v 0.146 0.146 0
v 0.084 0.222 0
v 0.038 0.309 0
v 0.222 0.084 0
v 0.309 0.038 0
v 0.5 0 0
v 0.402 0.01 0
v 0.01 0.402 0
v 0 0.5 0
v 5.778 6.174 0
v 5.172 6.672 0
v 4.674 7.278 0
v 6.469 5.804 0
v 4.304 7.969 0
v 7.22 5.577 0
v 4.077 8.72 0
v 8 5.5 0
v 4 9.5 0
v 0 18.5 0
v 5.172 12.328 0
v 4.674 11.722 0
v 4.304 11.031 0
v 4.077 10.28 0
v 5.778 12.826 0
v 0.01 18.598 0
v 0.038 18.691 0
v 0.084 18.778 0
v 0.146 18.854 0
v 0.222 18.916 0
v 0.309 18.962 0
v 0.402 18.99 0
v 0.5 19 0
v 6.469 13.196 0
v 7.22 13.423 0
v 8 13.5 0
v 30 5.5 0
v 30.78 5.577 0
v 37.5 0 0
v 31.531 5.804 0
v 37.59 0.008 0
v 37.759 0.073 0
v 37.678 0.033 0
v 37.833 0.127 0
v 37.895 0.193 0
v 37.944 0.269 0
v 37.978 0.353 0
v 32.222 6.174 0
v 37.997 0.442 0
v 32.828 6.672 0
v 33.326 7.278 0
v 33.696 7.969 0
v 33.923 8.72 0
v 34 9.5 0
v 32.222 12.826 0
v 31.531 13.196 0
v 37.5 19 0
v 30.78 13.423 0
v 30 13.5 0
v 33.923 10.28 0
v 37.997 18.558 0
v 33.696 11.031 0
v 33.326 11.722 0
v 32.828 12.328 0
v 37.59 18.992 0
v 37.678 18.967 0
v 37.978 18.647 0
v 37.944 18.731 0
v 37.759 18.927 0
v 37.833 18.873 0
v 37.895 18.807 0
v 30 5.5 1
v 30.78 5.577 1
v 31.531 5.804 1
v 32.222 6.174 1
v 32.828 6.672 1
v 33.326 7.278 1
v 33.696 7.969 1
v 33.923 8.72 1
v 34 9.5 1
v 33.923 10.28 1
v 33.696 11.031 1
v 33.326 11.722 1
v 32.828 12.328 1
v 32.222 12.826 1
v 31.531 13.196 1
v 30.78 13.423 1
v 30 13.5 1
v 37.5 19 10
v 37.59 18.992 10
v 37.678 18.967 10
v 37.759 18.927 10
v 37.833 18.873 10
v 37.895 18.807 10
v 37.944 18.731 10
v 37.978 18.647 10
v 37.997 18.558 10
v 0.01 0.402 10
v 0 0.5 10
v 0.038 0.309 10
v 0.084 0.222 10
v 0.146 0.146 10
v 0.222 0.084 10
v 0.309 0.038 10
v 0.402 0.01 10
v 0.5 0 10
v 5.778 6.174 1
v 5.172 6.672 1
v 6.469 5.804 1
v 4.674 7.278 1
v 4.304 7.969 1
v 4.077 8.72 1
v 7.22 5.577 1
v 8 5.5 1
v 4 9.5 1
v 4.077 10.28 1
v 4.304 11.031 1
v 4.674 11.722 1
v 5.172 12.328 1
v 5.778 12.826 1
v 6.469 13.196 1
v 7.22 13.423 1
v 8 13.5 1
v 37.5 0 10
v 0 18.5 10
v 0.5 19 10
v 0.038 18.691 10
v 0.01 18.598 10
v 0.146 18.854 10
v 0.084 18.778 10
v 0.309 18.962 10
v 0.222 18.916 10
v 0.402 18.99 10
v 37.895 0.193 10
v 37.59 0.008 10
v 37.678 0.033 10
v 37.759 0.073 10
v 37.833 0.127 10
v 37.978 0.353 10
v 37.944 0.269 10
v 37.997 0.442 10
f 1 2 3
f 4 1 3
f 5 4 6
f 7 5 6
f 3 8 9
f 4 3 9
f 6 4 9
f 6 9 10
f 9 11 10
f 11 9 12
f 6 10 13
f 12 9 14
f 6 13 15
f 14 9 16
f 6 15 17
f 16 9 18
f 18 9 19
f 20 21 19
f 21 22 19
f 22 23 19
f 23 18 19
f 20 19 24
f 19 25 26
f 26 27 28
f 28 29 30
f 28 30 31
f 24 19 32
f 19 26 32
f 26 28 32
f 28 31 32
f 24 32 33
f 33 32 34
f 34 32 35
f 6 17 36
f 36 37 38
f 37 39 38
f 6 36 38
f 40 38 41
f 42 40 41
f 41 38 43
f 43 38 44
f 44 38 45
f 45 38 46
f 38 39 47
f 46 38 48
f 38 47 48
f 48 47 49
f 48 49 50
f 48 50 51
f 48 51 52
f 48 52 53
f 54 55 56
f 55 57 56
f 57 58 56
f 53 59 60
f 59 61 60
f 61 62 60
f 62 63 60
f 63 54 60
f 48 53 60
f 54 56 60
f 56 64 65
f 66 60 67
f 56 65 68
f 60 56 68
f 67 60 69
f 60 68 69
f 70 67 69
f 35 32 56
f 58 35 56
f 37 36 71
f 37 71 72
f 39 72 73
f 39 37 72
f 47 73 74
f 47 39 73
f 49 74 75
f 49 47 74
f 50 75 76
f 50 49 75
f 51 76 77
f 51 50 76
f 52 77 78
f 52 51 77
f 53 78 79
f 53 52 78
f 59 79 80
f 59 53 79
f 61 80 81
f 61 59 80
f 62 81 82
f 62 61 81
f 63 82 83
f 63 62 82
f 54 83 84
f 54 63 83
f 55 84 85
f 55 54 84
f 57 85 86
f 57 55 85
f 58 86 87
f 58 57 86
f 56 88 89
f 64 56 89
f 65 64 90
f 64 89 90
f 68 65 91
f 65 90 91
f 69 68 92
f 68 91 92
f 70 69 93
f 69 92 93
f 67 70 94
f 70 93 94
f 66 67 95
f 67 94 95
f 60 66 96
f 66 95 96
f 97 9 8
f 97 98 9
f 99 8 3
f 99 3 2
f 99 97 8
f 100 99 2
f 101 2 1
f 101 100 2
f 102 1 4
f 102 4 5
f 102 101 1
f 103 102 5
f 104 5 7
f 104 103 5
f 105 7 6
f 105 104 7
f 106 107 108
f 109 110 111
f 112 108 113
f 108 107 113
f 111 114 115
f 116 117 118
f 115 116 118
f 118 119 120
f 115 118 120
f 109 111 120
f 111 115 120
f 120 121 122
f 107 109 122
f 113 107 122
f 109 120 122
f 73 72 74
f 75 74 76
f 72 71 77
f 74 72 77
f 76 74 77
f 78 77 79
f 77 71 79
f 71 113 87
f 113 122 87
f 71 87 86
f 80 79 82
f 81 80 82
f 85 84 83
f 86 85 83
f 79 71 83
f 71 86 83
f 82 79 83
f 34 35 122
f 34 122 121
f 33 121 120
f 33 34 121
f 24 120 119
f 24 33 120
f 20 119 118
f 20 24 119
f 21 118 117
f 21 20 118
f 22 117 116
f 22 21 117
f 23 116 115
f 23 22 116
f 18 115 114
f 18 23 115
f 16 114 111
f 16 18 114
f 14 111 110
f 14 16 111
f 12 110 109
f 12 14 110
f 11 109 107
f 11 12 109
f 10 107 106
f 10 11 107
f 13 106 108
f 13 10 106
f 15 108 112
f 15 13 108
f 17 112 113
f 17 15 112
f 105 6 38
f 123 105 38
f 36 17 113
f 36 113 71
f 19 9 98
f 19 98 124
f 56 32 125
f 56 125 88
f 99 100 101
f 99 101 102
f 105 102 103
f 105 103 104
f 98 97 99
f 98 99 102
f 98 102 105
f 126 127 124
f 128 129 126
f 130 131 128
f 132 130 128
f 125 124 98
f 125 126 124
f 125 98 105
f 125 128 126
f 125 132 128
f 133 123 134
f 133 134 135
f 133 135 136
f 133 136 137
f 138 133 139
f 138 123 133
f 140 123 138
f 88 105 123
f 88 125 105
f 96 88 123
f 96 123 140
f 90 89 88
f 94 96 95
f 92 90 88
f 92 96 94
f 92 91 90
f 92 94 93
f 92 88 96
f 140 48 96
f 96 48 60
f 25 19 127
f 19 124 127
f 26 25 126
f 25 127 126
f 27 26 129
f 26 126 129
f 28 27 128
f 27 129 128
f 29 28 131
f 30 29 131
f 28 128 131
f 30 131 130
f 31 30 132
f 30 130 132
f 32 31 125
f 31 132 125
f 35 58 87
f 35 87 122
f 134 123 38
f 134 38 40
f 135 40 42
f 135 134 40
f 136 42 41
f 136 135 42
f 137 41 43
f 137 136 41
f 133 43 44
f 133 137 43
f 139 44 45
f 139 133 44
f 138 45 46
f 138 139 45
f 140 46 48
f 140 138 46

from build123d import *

# Parameters (mm, degrees)
SKETCH_1_W          = 38
SKETCH_1_H          = 19
EXTRUDE_1_DEPTH     = 10
SKETCH_2_W          = 1.5
SKETCH_2_H          = 9
EXTRUDE_2_DEPTH     = 9
SKETCH_3_R          = 1.5
CUT_EXTRUDE_1_DEPTH = 52.322509681
FILLET_2_R          = 0.5
CUT_EXTRUDE_2_DEPTH = 1
SKETCH_5_W          = 59.581818612
SKETCH_5_H          = 24.32156281
SKETCH_5_W_2        = 37.996651515
SKETCH_5_H_2        = 19
CUT_EXTRUDE_3_DEPTH = 52.672042731


with BuildPart() as part:
    # 草图1 → 凸台-拉伸1 (new body)
    with BuildSketch(Plane.XY):
        with Locations((19, 9.5)):
            Rectangle(SKETCH_1_W, SKETCH_1_H)
    extrude(amount=EXTRUDE_1_DEPTH)

    # 草图2 → 凸台-拉伸2 (add)
    with BuildSketch(Plane(origin=(38, 0, 0), x_dir=(0, 0, -1), z_dir=(1, 0, 0))):
        with Locations((-2.75, 9.5)):
            Rectangle(SKETCH_2_W, SKETCH_2_H)
    extrude_2 = extrude(amount=EXTRUDE_2_DEPTH)

    # 草图3 → 切除-拉伸1 (cut, through all)
    with BuildSketch(Plane(origin=(0, 0, 2), x_dir=(-1, 0, 0), z_dir=(0, 0, -1))):
        with Locations((-42.5, 9.5)):
            Circle(SKETCH_3_R)
    cut_extrude_1 = extrude(amount=-CUT_EXTRUDE_1_DEPTH, mode=Mode.SUBTRACT)

    # 镜向3: 凸台-拉伸2, 切除-拉伸1 across plane
    add(extrude_2.mirror(Plane(origin=(19, 0, 0), x_dir=(0, 0, 1), z_dir=(1, 0, 0))))
    add(cut_extrude_1.mirror(Plane(origin=(19, 0, 0), x_dir=(0, 0, 1), z_dir=(1, 0, 0))), mode=Mode.SUBTRACT)

    # 圆角2
    fillet_2_edges = [part.edges().sort_by_distance(p)[0] for p in [
        (38, 5, 2.75),
        (38, 14, 2.75),
        (47, 5, 2.75),
        (47, 14, 2.75),
        (-9, 14, 2.75),
        (-9, 5, 2.75),
        (0, 5, 2.75),
        (0, 14, 2.75),
        (0, 19, 5),
        (38, 19, 5),
        (38, 0, 5),
        (0, 0, 5),
    ]]
    fillet(fillet_2_edges, radius=FILLET_2_R)

    # 草图4 → 切除-拉伸2 (cut)
    with BuildSketch(Plane(origin=(0, 0, 0), x_dir=(-1, 0, 0), z_dir=(0, 0, -1))):
        with BuildLine():
            Line((-30, 13.5), (-8, 13.5))
            ThreePointArc((-8, 13.5), (-4, 9.5), (-8, 5.5))
            Line((-8, 5.5), (-30, 5.5))
            ThreePointArc((-30, 5.5), (-34, 9.5), (-30, 13.5))
        make_face()
    extrude(amount=-CUT_EXTRUDE_2_DEPTH, mode=Mode.SUBTRACT)

    # 草图5 → 切除-拉伸3 (cut, through all)
    with BuildSketch(Plane(origin=(0, 0, 0), x_dir=(-1, 0, 0), z_dir=(0, 0, -1))):
        with Locations((-19.067430593, 9.084908835)):
            Rectangle(SKETCH_5_W, SKETCH_5_H)
        with Locations((-18.998325758, 9.5)):
            Rectangle(SKETCH_5_W_2, SKETCH_5_H_2, mode=Mode.SUBTRACT)
    extrude(amount=-CUT_EXTRUDE_3_DEPTH, mode=Mode.SUBTRACT)


solid = part.part
